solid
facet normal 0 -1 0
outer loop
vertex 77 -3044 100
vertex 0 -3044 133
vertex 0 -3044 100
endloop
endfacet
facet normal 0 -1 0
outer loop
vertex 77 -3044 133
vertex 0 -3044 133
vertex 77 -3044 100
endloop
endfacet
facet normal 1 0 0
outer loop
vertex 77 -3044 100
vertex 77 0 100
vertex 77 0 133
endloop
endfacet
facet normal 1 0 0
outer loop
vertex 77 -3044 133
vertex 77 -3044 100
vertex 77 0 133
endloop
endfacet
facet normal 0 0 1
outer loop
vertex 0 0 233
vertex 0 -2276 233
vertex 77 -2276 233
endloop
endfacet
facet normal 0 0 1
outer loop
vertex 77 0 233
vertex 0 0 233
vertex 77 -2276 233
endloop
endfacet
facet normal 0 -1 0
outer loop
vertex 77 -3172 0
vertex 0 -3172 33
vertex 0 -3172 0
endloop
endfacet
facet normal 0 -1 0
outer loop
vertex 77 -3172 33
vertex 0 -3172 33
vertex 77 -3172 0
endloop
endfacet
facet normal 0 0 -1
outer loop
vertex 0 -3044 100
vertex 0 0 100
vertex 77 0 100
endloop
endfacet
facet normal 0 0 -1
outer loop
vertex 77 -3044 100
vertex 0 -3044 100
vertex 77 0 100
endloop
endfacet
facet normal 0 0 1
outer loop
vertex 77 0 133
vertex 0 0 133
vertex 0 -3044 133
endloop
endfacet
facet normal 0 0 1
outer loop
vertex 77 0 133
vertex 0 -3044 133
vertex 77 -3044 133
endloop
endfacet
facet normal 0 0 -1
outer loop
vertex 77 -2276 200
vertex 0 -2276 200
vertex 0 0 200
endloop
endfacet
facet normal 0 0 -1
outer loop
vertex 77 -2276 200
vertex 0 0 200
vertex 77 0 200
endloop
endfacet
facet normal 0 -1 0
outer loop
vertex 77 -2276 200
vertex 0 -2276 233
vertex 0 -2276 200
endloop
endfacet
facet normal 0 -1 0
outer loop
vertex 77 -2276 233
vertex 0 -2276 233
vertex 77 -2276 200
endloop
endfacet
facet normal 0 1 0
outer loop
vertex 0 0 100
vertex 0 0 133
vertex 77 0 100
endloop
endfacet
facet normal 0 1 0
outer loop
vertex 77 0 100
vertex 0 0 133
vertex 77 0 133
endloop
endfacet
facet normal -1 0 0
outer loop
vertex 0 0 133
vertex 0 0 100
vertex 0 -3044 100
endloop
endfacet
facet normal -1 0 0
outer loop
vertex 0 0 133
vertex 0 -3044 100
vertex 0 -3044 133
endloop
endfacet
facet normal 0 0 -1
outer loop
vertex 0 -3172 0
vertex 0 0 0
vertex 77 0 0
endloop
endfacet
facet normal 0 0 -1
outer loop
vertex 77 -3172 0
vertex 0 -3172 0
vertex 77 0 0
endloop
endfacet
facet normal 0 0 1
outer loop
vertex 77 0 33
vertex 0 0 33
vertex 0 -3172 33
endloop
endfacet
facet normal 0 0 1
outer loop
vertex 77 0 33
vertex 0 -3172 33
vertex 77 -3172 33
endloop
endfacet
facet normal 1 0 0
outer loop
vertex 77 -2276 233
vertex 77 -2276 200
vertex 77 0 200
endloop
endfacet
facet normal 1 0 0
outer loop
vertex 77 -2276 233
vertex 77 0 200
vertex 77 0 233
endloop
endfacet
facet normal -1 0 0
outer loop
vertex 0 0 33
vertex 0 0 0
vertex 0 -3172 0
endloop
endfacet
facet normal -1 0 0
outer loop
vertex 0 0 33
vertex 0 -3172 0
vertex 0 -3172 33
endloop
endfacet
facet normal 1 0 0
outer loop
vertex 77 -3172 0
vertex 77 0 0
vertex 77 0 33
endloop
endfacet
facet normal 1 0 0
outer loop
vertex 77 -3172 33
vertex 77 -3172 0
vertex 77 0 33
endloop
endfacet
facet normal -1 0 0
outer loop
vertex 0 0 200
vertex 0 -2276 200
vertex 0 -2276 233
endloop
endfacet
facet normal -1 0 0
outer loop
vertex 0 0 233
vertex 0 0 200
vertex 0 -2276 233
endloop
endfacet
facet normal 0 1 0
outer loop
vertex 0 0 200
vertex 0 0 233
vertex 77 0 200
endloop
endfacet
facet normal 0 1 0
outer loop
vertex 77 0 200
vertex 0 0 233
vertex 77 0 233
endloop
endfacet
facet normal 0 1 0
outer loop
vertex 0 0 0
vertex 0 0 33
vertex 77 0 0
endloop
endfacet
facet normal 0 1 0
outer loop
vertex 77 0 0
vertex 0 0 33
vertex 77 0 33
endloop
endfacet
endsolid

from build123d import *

# Parameters (mm, degrees)
F0_W     = 77
F0_H     = 33
F1_DEPTH = 3172
F2_DEPTH = 3044
F3_DEPTH = 2276


with BuildPart() as f1:
    # F0 (on Front) → F1 (new body)
    with BuildSketch(Plane.XZ):
        with Locations((38.5, 16.5)):
            Rectangle(F0_W, F0_H)
    extrude(amount=F1_DEPTH)


with BuildPart() as f2:
    # F0 (on Front) → F2 (new body)
    with BuildSketch(Plane.XZ):
        with Locations((38.5, 116.5)):
            Rectangle(F0_W, F0_H)
    extrude(amount=F2_DEPTH)


with BuildPart() as f3:
    # F0 (on Front) → F3 (new body)
    with BuildSketch(Plane.XZ):
        with Locations((38.5, 216.5)):
            Rectangle(F0_W, F0_H)
    extrude(amount=F3_DEPTH)


solid = Compound([f1.part, f2.part, f3.part])
